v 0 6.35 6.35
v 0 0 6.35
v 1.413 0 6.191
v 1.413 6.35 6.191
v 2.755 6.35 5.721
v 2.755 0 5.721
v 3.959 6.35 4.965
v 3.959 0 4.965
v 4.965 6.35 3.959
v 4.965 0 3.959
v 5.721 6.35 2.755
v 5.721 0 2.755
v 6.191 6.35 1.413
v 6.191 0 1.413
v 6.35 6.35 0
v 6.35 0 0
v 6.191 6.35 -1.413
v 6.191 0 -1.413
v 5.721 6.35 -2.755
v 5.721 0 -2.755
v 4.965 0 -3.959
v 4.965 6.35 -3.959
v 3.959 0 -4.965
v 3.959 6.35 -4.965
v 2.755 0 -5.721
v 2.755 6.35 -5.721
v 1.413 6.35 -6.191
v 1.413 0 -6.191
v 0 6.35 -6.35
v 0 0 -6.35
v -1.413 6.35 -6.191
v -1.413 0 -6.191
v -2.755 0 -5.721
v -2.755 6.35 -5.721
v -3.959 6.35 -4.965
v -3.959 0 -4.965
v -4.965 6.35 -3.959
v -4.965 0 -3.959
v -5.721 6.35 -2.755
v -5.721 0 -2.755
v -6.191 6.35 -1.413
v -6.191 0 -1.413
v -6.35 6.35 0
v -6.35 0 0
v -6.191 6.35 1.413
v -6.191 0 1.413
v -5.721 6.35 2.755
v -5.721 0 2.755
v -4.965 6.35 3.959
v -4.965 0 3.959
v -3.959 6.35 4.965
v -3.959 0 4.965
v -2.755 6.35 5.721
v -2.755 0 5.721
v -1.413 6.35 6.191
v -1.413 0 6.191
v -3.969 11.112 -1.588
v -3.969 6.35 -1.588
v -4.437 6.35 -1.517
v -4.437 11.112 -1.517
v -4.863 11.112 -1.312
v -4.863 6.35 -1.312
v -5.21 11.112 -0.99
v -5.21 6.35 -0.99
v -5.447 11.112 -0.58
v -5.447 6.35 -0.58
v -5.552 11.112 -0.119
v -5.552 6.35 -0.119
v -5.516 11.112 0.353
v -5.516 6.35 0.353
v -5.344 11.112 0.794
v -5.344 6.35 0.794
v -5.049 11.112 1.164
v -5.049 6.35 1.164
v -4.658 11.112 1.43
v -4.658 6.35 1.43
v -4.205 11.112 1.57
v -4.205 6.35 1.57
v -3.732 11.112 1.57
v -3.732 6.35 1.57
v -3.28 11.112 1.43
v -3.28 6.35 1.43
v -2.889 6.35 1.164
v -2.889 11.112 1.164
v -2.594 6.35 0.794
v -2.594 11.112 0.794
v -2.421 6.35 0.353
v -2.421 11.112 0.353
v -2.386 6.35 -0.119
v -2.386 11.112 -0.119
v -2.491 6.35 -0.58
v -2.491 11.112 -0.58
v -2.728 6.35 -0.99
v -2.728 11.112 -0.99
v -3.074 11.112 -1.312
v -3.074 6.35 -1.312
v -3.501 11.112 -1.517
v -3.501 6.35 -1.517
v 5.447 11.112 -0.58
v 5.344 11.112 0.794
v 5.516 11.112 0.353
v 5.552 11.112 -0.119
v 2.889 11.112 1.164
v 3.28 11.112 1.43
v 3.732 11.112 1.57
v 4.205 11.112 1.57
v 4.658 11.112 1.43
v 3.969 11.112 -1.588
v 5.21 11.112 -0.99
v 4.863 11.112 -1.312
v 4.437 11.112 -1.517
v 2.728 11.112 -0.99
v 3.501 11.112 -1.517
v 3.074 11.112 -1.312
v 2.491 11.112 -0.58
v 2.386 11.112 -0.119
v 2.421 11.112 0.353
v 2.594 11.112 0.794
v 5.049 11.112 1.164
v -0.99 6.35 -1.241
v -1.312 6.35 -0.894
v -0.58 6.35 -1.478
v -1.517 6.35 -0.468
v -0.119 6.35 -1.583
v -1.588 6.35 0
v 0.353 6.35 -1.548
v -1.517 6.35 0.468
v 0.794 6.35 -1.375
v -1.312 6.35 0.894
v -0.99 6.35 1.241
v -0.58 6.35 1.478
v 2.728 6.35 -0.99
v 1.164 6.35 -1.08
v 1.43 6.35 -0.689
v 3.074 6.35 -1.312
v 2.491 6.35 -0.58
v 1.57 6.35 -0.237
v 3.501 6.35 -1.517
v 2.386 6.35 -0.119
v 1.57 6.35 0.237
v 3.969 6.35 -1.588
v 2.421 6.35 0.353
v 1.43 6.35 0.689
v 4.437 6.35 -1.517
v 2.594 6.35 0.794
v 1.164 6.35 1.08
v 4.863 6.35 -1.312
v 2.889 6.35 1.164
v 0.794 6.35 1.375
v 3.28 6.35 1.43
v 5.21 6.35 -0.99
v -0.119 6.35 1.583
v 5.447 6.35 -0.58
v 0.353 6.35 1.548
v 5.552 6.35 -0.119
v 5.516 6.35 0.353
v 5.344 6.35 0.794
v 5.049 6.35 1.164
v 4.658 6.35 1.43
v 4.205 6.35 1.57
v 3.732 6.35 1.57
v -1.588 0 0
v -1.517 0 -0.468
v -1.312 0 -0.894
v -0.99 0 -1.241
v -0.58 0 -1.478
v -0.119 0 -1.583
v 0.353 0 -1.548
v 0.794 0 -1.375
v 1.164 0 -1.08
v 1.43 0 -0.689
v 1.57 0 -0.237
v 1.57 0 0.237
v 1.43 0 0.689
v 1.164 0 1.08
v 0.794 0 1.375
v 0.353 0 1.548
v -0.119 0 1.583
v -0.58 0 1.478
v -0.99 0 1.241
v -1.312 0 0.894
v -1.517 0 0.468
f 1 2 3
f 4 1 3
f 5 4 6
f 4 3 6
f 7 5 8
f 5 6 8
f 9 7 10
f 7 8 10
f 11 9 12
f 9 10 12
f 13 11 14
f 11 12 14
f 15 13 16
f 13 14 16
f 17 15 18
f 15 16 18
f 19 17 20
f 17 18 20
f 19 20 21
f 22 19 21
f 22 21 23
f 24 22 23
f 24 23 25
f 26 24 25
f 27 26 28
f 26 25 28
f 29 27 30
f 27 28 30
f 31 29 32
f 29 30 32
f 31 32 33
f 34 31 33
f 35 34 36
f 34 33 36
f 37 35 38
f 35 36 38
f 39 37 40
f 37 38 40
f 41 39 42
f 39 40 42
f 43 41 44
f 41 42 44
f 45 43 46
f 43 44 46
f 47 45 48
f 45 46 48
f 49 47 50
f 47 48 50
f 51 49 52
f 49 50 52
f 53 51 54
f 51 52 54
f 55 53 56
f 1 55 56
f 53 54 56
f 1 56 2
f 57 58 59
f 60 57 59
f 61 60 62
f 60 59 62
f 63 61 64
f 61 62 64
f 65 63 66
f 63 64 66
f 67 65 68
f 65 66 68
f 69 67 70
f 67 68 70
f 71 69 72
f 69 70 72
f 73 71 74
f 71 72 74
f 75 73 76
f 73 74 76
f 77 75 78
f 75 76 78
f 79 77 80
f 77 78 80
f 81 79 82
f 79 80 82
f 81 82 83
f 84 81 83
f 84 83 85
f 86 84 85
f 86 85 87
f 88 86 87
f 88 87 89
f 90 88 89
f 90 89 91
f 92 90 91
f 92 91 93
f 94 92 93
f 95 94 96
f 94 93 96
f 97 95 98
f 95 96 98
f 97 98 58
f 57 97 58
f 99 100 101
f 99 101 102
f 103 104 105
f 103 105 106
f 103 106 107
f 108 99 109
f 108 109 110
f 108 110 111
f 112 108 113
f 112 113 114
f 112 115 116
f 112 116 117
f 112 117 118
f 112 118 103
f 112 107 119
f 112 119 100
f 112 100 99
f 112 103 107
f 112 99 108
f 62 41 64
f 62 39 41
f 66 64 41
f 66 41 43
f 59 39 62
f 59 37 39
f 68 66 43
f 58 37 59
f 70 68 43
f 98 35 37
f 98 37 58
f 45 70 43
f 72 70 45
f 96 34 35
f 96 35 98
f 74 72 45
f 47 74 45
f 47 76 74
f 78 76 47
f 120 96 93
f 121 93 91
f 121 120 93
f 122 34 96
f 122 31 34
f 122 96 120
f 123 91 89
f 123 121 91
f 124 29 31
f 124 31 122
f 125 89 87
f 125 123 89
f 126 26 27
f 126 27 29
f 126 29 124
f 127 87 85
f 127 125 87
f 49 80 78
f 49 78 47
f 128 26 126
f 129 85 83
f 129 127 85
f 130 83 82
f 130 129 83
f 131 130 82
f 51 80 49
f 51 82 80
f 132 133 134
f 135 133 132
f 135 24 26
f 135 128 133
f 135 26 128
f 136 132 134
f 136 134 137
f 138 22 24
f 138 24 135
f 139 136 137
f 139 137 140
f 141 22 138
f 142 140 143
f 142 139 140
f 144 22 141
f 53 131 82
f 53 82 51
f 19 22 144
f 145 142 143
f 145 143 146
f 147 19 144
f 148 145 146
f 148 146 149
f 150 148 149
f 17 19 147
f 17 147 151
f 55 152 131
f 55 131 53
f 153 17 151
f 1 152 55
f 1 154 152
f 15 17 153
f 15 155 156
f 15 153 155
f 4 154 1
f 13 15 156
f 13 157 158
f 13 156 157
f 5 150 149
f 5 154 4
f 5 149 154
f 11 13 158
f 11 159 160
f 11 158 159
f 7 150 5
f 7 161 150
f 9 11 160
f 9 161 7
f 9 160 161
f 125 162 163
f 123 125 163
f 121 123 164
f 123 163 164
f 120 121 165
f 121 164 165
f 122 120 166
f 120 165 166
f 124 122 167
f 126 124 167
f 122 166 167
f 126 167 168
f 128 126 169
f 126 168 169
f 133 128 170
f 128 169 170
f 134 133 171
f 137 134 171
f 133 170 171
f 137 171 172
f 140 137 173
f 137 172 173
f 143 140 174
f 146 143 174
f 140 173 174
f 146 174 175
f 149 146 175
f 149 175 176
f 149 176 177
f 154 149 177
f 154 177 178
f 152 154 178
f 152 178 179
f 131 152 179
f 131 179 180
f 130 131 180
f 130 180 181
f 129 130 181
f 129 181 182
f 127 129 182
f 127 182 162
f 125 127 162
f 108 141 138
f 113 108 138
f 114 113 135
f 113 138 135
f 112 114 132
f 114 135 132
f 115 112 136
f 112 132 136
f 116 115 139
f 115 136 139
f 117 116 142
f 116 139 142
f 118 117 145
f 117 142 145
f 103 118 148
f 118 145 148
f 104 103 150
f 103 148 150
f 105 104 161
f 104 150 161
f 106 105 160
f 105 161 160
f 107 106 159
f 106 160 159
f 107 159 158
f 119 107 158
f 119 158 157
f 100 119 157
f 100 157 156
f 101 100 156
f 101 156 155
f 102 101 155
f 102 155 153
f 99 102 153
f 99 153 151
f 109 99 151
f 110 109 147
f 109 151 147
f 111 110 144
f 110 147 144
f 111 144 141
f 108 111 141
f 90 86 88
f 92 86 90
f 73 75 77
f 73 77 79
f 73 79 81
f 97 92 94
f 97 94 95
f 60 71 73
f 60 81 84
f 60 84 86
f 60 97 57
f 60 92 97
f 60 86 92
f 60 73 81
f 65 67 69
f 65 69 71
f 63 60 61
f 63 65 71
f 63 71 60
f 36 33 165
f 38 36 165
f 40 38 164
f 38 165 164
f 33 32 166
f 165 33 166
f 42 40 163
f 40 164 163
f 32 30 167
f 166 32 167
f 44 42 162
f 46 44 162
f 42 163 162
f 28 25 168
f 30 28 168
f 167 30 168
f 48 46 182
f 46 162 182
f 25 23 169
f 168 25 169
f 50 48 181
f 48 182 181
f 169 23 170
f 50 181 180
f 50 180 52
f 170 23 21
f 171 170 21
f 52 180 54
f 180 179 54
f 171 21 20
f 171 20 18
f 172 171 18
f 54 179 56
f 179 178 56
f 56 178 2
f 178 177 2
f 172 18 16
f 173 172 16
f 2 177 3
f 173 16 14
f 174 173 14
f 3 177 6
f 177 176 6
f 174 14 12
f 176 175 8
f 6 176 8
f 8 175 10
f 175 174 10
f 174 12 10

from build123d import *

# Parameters (mm, degrees)
SKETCH1_R                    = 6.35
BOSS_EXTRUDE1_DEPTH          = 6.35
F_1_8_0_125_DIAMETER_HOLE1_D = 3.175
SKETCH4_R                    = 1.5875
BOSS_EXTRUDE2_DEPTH          = 4.7625


with BuildPart() as part:
    # Sketch1 → Boss-Extrude1 (new body)
    with BuildSketch(Plane(origin=(0, 0, 0), x_dir=(1, 0, 0), z_dir=(0, 1, 0))):
        with Locations(Location((0, 0, 0), (0, 0, 270))):
            Circle(SKETCH1_R)
    extrude(amount=BOSS_EXTRUDE1_DEPTH)

    # 1/8 (0.125) Diameter Hole1 (through all)
    with Locations(Plane(origin=(0, 6.35, 0), x_dir=(1, 0, 0), z_dir=(0, 1, 0))):
        with Locations((0, 0)):
            Hole(F_1_8_0_125_DIAMETER_HOLE1_D / 2)

    # Sketch4 → Boss-Extrude2 (add)
    with BuildSketch(Plane(origin=(0, 6.35, 0), x_dir=(1, 0, 0), z_dir=(0, 1, 0))):
        with Locations(Location((3.96875, 0, 0), (0, 0, 90))):
            Circle(SKETCH4_R)
        with Locations(Location((-3.96875, 0, 0), (0, 0, 90))):
            Circle(SKETCH4_R)
    extrude(amount=BOSS_EXTRUDE2_DEPTH)


solid = part.part
